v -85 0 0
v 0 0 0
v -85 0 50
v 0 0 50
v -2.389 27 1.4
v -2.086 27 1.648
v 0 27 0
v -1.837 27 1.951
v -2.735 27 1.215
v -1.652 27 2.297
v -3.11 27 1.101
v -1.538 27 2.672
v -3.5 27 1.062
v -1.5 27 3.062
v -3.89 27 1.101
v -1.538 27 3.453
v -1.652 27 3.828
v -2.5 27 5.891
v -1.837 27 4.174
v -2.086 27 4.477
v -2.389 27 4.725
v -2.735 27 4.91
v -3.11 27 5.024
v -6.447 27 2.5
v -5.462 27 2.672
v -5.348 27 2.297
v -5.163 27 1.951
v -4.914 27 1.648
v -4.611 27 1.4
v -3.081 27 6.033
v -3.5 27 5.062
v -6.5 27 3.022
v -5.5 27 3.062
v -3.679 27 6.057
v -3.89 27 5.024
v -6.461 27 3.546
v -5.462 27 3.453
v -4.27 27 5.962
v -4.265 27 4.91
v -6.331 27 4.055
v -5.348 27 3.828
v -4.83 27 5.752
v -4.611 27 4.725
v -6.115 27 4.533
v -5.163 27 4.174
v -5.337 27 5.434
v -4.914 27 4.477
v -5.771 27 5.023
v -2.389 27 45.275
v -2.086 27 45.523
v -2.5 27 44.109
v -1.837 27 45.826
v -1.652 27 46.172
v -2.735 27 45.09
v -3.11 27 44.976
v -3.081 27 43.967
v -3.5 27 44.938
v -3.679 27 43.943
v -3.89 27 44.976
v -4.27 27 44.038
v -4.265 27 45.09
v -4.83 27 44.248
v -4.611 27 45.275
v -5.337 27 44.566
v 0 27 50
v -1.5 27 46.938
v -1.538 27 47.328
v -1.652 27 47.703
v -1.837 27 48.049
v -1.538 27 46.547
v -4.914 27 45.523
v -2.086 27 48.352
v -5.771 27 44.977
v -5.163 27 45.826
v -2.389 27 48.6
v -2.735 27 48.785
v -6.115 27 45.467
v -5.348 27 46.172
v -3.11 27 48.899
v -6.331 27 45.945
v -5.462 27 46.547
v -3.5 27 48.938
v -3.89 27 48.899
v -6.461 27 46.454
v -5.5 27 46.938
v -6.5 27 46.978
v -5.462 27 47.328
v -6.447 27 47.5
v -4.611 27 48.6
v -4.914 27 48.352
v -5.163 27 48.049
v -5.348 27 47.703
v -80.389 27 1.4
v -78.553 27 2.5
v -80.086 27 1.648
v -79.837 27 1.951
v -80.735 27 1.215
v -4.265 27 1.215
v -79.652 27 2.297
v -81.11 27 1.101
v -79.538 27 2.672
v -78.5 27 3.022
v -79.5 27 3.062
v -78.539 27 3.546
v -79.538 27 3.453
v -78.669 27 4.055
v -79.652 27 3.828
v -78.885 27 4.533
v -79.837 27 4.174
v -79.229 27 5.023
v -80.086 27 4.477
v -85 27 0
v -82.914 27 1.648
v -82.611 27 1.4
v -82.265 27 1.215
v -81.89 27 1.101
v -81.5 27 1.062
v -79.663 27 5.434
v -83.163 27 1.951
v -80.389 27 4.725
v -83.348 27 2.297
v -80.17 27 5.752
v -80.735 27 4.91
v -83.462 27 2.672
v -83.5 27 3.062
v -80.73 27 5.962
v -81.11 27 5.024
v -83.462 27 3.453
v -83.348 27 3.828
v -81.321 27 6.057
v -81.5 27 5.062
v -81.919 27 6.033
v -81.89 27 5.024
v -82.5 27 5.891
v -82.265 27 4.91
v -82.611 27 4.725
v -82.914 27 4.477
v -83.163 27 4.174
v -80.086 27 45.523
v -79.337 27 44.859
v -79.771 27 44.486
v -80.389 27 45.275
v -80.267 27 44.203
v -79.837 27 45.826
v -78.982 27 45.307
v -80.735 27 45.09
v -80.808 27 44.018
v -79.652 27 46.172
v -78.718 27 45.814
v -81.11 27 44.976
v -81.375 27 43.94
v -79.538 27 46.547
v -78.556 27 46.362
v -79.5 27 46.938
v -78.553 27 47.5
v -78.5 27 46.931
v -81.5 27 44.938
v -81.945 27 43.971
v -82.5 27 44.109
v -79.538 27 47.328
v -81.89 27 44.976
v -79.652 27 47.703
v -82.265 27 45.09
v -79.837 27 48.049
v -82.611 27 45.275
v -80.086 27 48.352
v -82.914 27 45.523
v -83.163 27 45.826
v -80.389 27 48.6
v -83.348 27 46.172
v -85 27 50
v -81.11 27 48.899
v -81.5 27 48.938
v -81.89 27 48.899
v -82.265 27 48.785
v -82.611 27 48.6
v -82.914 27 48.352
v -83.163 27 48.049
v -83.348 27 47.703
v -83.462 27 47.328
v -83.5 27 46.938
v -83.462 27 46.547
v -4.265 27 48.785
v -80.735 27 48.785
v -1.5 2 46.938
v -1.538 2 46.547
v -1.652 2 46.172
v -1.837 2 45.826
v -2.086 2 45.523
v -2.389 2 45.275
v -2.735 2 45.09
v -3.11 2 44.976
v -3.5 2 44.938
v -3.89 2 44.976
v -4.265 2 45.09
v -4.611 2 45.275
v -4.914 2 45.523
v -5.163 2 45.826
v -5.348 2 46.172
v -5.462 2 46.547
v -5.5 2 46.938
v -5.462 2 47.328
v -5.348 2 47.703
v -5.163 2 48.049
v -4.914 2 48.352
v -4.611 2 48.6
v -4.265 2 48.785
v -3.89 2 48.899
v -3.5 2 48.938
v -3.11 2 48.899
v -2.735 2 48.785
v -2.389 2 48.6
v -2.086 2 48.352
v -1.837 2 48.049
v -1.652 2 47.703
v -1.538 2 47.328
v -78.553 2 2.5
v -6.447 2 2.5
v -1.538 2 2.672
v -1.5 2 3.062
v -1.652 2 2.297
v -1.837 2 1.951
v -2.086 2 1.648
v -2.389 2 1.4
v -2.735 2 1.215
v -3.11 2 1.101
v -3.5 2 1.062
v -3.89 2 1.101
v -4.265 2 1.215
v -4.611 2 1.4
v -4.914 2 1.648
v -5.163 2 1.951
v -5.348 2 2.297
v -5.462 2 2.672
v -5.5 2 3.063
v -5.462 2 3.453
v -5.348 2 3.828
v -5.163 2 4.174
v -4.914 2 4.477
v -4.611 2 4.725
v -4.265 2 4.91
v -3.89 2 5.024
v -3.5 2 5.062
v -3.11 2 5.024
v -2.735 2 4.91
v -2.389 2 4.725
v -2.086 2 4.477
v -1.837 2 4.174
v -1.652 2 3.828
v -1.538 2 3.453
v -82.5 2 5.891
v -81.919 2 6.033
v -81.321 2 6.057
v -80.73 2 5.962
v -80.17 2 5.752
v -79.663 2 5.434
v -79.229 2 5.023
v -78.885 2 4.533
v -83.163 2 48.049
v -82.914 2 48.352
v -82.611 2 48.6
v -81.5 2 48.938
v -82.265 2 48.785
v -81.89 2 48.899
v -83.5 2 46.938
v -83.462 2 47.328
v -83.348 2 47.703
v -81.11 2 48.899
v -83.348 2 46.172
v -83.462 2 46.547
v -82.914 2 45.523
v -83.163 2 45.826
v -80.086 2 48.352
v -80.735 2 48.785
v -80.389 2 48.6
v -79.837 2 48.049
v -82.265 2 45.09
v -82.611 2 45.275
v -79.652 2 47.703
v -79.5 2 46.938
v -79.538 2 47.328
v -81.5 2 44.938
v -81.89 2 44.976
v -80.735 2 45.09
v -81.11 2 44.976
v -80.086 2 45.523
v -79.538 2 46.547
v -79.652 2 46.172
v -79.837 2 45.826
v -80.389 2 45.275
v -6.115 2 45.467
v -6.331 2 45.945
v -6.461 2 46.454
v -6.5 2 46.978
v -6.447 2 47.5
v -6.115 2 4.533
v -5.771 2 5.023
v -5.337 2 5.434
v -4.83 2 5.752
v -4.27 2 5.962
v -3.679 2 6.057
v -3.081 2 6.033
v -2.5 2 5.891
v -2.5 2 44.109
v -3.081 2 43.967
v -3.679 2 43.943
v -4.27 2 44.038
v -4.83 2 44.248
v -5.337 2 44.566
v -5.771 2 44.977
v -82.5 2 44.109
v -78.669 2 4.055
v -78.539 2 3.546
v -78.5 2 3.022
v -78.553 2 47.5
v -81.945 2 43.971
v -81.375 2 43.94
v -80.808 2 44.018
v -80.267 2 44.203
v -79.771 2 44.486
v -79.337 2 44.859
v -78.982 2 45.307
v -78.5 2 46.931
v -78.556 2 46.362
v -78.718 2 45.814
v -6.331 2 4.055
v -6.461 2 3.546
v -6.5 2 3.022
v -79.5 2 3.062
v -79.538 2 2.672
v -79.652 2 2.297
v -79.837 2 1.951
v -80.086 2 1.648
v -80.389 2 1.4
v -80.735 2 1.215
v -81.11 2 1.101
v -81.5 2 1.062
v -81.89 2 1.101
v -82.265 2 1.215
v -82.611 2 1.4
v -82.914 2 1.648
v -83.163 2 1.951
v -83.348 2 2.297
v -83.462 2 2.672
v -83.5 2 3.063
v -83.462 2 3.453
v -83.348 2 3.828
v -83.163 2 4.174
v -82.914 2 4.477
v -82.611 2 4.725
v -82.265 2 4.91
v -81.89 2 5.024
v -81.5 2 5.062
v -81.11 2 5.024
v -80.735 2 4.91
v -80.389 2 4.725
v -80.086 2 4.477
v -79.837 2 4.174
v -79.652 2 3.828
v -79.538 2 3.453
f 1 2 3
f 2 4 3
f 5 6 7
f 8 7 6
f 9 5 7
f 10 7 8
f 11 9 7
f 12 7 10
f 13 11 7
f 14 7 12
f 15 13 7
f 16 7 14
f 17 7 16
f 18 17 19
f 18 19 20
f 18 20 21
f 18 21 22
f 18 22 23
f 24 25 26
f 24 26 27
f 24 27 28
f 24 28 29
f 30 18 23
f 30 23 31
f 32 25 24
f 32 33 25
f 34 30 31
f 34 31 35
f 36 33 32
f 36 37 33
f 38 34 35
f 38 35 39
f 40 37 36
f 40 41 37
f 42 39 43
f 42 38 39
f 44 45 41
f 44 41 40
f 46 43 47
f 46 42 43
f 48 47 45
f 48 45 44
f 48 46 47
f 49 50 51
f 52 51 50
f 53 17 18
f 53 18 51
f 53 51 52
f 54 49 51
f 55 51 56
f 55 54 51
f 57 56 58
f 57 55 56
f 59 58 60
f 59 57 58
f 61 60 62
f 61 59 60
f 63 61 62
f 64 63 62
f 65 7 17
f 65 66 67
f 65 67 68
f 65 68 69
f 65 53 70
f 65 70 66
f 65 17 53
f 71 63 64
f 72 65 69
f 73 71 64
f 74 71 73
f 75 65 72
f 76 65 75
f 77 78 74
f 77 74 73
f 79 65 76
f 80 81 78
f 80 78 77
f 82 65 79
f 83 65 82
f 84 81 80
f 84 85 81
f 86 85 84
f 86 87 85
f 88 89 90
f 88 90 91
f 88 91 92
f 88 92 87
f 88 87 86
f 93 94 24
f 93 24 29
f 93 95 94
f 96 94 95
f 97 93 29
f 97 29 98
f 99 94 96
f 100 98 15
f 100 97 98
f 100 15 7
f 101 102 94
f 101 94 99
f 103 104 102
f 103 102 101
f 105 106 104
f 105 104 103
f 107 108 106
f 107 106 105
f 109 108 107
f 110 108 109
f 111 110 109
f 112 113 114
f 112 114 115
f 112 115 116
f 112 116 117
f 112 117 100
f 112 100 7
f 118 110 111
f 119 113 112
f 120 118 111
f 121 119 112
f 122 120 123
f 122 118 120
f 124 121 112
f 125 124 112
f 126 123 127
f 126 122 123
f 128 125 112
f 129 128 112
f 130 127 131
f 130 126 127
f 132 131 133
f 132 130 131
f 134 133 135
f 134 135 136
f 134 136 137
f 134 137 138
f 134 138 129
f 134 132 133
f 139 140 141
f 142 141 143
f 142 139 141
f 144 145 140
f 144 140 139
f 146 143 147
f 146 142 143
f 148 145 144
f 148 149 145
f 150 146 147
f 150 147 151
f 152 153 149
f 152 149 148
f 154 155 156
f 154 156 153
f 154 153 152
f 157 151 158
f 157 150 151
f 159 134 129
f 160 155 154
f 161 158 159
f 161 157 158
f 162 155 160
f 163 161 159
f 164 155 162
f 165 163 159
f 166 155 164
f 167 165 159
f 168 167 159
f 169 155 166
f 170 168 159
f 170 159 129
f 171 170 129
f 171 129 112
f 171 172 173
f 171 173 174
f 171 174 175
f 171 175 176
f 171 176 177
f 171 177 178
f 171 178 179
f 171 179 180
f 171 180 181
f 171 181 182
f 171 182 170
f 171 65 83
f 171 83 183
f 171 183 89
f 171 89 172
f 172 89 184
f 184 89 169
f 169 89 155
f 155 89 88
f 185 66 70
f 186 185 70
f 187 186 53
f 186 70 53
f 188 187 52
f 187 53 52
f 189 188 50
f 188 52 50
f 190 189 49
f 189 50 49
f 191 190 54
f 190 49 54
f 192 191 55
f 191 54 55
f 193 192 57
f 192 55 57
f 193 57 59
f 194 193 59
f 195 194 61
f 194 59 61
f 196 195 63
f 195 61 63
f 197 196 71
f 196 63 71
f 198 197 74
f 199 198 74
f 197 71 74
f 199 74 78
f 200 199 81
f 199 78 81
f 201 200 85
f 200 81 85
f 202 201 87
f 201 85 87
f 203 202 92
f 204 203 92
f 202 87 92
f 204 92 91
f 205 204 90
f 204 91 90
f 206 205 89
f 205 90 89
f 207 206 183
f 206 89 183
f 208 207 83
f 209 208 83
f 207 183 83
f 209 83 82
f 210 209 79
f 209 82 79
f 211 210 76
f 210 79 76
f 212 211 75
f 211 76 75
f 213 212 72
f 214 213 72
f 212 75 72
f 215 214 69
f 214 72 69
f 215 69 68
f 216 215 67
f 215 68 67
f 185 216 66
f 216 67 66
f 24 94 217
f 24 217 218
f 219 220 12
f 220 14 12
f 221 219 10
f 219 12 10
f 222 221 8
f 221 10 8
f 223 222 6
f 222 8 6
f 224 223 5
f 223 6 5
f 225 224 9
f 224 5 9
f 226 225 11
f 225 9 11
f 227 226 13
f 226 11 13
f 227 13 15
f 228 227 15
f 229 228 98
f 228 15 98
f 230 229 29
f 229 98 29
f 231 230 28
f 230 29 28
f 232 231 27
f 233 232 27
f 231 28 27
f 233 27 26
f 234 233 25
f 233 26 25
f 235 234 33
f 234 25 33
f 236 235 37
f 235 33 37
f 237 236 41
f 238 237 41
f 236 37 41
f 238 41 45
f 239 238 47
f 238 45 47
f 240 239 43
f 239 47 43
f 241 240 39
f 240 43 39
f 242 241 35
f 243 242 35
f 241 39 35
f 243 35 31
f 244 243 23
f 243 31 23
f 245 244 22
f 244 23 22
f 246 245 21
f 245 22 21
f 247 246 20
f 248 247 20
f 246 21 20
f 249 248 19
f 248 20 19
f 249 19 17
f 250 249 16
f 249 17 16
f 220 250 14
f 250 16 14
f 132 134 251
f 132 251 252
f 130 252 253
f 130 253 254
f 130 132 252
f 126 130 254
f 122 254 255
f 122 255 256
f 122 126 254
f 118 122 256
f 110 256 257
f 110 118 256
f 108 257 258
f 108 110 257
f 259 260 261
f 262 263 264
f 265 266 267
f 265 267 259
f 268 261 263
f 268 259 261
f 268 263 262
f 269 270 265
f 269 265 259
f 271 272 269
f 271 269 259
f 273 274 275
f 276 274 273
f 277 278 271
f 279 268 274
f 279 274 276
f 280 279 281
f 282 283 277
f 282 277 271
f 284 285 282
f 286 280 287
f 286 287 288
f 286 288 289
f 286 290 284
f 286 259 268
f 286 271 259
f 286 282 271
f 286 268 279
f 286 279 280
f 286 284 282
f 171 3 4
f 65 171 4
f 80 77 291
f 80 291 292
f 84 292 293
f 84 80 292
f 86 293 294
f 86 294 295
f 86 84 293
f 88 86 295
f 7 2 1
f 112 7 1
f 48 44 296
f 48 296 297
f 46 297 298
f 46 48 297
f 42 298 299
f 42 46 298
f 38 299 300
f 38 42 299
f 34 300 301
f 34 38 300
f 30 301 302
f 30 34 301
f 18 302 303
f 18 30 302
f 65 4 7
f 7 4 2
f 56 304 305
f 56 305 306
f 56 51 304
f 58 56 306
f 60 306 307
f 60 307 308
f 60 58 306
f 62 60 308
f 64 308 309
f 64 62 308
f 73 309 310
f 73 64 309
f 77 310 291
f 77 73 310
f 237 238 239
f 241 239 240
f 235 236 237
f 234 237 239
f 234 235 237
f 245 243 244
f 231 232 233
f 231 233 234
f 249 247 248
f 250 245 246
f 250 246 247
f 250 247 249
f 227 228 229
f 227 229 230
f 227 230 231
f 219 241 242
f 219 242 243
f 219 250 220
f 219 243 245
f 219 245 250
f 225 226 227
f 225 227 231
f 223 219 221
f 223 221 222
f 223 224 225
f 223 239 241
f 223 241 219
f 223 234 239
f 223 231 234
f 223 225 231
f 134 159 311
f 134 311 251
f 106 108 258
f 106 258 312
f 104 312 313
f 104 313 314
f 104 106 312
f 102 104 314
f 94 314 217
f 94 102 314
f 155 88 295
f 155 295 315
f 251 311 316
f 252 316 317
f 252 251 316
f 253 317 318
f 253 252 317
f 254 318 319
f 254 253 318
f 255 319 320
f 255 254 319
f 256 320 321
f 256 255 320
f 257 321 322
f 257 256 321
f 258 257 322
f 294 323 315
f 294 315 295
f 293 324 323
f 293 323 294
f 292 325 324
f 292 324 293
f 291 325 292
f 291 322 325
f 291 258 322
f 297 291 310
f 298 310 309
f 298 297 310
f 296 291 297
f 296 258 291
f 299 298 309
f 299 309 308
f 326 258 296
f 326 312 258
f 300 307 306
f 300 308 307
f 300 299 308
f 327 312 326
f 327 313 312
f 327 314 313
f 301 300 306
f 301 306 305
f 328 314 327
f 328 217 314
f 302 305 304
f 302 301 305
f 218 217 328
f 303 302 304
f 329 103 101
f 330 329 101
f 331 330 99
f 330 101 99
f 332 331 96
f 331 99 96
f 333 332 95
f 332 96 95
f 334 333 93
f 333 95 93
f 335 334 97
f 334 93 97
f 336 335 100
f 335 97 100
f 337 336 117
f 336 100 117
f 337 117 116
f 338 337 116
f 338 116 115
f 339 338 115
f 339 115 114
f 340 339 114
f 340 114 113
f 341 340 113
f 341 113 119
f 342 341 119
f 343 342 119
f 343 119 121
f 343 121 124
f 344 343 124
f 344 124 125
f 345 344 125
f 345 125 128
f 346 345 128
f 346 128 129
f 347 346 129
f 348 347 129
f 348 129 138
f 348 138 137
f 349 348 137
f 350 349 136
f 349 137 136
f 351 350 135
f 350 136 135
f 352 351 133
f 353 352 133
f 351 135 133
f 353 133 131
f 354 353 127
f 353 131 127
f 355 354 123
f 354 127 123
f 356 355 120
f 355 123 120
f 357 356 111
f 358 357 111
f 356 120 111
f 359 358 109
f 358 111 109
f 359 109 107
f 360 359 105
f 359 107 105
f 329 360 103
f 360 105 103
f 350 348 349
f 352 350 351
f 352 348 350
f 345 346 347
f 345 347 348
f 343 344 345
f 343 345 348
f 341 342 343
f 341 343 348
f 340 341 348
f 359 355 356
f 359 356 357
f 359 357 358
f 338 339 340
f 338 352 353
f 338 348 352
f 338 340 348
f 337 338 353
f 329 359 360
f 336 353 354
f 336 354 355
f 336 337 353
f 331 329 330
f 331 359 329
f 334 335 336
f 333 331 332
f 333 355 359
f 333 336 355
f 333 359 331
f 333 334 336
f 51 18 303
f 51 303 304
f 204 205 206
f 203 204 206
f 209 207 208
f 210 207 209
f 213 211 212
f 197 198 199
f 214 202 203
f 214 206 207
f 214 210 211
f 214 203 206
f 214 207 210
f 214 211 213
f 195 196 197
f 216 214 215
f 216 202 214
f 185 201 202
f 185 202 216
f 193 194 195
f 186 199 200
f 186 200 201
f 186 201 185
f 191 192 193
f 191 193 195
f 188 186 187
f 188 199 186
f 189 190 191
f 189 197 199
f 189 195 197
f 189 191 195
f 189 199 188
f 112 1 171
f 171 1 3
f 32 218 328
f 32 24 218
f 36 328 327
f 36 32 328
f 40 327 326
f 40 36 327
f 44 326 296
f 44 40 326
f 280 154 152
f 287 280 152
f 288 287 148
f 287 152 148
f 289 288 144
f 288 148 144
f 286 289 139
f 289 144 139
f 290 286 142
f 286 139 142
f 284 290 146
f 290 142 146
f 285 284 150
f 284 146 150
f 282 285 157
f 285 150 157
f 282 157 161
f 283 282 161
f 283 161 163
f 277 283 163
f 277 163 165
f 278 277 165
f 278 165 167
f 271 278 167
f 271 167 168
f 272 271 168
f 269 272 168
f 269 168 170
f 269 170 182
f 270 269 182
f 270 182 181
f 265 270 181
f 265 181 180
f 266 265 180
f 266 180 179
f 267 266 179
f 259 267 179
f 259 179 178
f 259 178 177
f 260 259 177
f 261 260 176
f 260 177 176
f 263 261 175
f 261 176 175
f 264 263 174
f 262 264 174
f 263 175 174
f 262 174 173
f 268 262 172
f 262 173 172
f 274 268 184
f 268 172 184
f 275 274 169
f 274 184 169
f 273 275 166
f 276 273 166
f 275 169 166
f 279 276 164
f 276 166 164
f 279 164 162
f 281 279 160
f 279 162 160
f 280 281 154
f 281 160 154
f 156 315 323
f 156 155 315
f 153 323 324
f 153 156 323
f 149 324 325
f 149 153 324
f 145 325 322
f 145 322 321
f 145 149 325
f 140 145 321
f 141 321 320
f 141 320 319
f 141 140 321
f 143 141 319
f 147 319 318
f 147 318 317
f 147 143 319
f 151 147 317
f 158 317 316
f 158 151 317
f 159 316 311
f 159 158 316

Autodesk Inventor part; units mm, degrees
ref_plane "YZ Plane" through (0, 0, 0) normal (1, 0, 0) x (0, 1, 0)
ref_plane "XZ Plane" through (0, 0, 0) normal (0, 1, 0) x (-1, 0, 0)
ref_plane "XY Plane" through (0, 0, 0) normal (0, 0, 1) x (1, 0, 0)
sketch "Esquisse1" plane through (0, 0, 0) normal (0, 1, 0) x (-1, 0, 0)
  line L0 (0, 0) -> (85, 0)
  line L1 (85, 0) -> (85, 50)
  line L2 (85, 50) -> (0, 50)
  line L3 (0, 50) -> (0, 0)
  dimension "d0" = 85
  dimension "d1" = 50
extrude "Extrusion1" add sketch "Esquisse1" along normal blind 27
sketch "Esquisse2" plane through (0, 27, 0) normal (0, 1, 0) x (1, 0, 0)
  line L0 (0, 0) -> (-85, 0) projected
  line L1 (-85, 0) -> (-85, -50) projected
  line L2 (-85, -50) -> (0, -50) projected
  line L3 (0, -50) -> (0, 0) projected
  line L4 (-82.5, -2.5) -> (-78.5532, -2.5)
  line L5 (-2.5, -2.5) -> (-2.5, -5.8909)
  line L6 (-2.5, -47.5) -> (-78.5532, -47.5)
  line L7 (-82.5, -47.5) -> (-82.5, -44.1091)
  line L8 (-82.5, -2.5) -> (-2.5, -47.5) construction
  line L9 (-2.5, -2.5) -> (-82.5, -47.5) construction
  circle A0 centre (-81.5, -3.0625) radius 2
  arc A1 (-78.8853, -4.5333) -> (-78.5532, -2.5) centre (-81.5, -3.0625) ccw
  line L10 (-42.5, -25) -> (-42.5, -2.5) construction
  line L11 (-42.5, -25) -> (-82.5, -25) construction
  circle A2 centre (-3.5, -3.0625) radius 2
  arc A3 (-6.1147, -4.5333) -> (-2.5, -5.8909) centre (-3.5, -3.0625) ccw
  circle A4 centre (-81.5, -46.9375) radius 2
  arc A5 (-78.5532, -47.5) -> (-82.5, -44.1091) centre (-81.5, -46.9375) ccw
  circle A6 centre (-3.5, -46.9375) radius 2
  arc A7 (-6.1147, -45.4667) -> (-6.4468, -47.5) centre (-3.5, -46.9375) ccw
  arc A8 (-82.5, -5.8909) -> (-78.8853, -4.5333) centre (-81.5, -3.0625) ccw
  arc A9 (-78.5532, -2.5) -> (-82.5, -5.8909) centre (-81.5, -3.0625) ccw
  arc A10 (-6.4468, -2.5) -> (-6.1147, -4.5333) centre (-3.5, -3.0625) ccw
  arc A11 (-2.5, -5.8909) -> (-6.4468, -2.5) centre (-3.5, -3.0625) ccw
  arc A12 (-2.5, -44.1091) -> (-6.1147, -45.4667) centre (-3.5, -46.9375) ccw
  arc A13 (-6.4468, -47.5) -> (-2.5, -44.1091) centre (-3.5, -46.9375) ccw
  arc A14 (-82.5, -44.1091) -> (-78.5532, -47.5) centre (-81.5, -46.9375) ccw
  line L12 (-78.5532, -47.5) -> (-82.5, -47.5)
  line L13 (-82.5, -44.1091) -> (-82.5, -2.5)
  line L14 (-42.5, -2.5) -> (-6.4468, -2.5)
  line L15 (-78.5532, -2.5) -> (-42.5, -2.5)
  line L16 (-6.4468, -2.5) -> (-2.5, -2.5)
  line L17 (-2.5, -5.8909) -> (-2.5, -25)
  line L18 (-2.5, -44.1091) -> (-2.5, -47.5)
  line L19 (-2.5, -25) -> (-2.5, -44.1091)
  dimension "d4" = 2.5
  dimension "d5" = 2.5
  dimension "d6" = 2.5
  dimension "d7" = 2.5
  dimension "d8" = 4
  dimension "d9" = 6
  dimension "d10" = 1
extrude "Extrusion2" cut sketch "Esquisse2" against normal blind 25 contours L13 A0 L4 | L4 A0 L13 | L15 L14 A10 A3 L17 L19 A12 A7 L6 A5 L13 A8 A1 | A4 L12 L7 | L7 L12 A4 | L16 L5 A2 | A2 L5 L16 | A6 L18 L6 | L6 L18 A6
equation "\"d5\" = d4"
equation "\"d6\" = d4"
equation "\"d7\" = d4"
properties part number "conrad_Strapubox_2028"
